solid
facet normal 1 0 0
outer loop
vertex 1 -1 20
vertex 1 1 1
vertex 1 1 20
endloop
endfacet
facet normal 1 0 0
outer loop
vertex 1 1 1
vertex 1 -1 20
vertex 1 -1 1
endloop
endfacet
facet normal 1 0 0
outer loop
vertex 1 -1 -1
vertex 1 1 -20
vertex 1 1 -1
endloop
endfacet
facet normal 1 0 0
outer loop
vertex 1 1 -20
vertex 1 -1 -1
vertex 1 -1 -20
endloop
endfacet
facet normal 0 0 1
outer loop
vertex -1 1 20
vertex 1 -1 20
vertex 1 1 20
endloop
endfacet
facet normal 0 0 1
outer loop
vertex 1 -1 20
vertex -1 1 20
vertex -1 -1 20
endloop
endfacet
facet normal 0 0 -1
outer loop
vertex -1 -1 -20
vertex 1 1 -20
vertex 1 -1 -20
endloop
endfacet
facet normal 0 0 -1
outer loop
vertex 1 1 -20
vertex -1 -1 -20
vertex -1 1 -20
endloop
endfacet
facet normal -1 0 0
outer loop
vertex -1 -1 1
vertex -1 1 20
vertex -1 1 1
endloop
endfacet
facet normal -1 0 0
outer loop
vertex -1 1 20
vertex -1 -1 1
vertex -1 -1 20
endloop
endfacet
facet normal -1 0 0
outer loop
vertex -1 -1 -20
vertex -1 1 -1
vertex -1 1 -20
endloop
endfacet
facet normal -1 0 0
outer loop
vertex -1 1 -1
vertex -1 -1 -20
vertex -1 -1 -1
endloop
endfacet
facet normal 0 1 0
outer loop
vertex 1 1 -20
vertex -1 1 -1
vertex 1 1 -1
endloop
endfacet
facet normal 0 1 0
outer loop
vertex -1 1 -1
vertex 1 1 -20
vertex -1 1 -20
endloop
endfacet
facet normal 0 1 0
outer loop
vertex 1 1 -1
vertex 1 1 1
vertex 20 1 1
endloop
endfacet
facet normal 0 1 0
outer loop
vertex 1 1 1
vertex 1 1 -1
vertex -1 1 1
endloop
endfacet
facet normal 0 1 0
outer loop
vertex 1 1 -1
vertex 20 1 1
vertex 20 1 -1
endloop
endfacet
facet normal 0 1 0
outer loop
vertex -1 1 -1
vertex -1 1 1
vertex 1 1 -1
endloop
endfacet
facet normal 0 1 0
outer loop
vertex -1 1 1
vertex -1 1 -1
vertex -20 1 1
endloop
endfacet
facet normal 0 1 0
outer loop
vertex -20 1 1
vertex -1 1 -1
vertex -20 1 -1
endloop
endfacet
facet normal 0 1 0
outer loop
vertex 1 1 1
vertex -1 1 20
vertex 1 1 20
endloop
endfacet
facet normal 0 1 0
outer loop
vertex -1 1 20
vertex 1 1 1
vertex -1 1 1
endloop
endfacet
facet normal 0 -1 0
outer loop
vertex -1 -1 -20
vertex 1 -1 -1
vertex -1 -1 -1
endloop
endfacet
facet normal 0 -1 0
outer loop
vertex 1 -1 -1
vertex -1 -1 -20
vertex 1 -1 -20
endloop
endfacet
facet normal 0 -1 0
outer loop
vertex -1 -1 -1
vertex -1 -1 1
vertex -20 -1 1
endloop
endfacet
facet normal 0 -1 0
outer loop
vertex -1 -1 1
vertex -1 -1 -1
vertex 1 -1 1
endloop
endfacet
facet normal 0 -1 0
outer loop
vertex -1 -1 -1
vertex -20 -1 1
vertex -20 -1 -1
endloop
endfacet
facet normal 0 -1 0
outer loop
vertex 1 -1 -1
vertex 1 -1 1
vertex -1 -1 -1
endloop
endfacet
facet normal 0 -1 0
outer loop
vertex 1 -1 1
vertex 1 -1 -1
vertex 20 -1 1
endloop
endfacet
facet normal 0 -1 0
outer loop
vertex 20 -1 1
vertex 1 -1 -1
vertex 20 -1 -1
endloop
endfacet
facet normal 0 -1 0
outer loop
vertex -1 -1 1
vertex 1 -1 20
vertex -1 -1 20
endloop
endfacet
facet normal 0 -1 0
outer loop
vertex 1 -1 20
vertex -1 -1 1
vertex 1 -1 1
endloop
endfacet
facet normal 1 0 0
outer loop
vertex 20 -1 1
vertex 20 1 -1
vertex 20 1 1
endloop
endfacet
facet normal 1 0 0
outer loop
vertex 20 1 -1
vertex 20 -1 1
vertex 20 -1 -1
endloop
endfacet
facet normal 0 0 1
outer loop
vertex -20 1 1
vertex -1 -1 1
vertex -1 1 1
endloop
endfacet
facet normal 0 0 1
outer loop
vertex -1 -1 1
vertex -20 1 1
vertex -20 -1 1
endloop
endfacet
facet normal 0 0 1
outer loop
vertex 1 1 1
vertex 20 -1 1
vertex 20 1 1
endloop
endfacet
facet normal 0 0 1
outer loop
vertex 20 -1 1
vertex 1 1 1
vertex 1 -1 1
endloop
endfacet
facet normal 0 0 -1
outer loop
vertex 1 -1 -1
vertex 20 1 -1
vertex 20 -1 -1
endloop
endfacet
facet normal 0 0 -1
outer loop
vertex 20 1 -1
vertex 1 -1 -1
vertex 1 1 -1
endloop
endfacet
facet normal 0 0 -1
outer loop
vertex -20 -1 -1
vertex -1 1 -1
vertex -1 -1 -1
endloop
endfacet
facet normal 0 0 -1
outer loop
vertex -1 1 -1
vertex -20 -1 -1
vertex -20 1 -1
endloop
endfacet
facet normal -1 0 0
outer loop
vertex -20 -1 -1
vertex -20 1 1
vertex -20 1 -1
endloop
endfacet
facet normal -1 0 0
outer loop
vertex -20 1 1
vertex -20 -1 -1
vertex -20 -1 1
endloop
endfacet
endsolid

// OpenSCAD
cube([2, 2, 40], center=true);

cube([40, 2, 2], center=true);
